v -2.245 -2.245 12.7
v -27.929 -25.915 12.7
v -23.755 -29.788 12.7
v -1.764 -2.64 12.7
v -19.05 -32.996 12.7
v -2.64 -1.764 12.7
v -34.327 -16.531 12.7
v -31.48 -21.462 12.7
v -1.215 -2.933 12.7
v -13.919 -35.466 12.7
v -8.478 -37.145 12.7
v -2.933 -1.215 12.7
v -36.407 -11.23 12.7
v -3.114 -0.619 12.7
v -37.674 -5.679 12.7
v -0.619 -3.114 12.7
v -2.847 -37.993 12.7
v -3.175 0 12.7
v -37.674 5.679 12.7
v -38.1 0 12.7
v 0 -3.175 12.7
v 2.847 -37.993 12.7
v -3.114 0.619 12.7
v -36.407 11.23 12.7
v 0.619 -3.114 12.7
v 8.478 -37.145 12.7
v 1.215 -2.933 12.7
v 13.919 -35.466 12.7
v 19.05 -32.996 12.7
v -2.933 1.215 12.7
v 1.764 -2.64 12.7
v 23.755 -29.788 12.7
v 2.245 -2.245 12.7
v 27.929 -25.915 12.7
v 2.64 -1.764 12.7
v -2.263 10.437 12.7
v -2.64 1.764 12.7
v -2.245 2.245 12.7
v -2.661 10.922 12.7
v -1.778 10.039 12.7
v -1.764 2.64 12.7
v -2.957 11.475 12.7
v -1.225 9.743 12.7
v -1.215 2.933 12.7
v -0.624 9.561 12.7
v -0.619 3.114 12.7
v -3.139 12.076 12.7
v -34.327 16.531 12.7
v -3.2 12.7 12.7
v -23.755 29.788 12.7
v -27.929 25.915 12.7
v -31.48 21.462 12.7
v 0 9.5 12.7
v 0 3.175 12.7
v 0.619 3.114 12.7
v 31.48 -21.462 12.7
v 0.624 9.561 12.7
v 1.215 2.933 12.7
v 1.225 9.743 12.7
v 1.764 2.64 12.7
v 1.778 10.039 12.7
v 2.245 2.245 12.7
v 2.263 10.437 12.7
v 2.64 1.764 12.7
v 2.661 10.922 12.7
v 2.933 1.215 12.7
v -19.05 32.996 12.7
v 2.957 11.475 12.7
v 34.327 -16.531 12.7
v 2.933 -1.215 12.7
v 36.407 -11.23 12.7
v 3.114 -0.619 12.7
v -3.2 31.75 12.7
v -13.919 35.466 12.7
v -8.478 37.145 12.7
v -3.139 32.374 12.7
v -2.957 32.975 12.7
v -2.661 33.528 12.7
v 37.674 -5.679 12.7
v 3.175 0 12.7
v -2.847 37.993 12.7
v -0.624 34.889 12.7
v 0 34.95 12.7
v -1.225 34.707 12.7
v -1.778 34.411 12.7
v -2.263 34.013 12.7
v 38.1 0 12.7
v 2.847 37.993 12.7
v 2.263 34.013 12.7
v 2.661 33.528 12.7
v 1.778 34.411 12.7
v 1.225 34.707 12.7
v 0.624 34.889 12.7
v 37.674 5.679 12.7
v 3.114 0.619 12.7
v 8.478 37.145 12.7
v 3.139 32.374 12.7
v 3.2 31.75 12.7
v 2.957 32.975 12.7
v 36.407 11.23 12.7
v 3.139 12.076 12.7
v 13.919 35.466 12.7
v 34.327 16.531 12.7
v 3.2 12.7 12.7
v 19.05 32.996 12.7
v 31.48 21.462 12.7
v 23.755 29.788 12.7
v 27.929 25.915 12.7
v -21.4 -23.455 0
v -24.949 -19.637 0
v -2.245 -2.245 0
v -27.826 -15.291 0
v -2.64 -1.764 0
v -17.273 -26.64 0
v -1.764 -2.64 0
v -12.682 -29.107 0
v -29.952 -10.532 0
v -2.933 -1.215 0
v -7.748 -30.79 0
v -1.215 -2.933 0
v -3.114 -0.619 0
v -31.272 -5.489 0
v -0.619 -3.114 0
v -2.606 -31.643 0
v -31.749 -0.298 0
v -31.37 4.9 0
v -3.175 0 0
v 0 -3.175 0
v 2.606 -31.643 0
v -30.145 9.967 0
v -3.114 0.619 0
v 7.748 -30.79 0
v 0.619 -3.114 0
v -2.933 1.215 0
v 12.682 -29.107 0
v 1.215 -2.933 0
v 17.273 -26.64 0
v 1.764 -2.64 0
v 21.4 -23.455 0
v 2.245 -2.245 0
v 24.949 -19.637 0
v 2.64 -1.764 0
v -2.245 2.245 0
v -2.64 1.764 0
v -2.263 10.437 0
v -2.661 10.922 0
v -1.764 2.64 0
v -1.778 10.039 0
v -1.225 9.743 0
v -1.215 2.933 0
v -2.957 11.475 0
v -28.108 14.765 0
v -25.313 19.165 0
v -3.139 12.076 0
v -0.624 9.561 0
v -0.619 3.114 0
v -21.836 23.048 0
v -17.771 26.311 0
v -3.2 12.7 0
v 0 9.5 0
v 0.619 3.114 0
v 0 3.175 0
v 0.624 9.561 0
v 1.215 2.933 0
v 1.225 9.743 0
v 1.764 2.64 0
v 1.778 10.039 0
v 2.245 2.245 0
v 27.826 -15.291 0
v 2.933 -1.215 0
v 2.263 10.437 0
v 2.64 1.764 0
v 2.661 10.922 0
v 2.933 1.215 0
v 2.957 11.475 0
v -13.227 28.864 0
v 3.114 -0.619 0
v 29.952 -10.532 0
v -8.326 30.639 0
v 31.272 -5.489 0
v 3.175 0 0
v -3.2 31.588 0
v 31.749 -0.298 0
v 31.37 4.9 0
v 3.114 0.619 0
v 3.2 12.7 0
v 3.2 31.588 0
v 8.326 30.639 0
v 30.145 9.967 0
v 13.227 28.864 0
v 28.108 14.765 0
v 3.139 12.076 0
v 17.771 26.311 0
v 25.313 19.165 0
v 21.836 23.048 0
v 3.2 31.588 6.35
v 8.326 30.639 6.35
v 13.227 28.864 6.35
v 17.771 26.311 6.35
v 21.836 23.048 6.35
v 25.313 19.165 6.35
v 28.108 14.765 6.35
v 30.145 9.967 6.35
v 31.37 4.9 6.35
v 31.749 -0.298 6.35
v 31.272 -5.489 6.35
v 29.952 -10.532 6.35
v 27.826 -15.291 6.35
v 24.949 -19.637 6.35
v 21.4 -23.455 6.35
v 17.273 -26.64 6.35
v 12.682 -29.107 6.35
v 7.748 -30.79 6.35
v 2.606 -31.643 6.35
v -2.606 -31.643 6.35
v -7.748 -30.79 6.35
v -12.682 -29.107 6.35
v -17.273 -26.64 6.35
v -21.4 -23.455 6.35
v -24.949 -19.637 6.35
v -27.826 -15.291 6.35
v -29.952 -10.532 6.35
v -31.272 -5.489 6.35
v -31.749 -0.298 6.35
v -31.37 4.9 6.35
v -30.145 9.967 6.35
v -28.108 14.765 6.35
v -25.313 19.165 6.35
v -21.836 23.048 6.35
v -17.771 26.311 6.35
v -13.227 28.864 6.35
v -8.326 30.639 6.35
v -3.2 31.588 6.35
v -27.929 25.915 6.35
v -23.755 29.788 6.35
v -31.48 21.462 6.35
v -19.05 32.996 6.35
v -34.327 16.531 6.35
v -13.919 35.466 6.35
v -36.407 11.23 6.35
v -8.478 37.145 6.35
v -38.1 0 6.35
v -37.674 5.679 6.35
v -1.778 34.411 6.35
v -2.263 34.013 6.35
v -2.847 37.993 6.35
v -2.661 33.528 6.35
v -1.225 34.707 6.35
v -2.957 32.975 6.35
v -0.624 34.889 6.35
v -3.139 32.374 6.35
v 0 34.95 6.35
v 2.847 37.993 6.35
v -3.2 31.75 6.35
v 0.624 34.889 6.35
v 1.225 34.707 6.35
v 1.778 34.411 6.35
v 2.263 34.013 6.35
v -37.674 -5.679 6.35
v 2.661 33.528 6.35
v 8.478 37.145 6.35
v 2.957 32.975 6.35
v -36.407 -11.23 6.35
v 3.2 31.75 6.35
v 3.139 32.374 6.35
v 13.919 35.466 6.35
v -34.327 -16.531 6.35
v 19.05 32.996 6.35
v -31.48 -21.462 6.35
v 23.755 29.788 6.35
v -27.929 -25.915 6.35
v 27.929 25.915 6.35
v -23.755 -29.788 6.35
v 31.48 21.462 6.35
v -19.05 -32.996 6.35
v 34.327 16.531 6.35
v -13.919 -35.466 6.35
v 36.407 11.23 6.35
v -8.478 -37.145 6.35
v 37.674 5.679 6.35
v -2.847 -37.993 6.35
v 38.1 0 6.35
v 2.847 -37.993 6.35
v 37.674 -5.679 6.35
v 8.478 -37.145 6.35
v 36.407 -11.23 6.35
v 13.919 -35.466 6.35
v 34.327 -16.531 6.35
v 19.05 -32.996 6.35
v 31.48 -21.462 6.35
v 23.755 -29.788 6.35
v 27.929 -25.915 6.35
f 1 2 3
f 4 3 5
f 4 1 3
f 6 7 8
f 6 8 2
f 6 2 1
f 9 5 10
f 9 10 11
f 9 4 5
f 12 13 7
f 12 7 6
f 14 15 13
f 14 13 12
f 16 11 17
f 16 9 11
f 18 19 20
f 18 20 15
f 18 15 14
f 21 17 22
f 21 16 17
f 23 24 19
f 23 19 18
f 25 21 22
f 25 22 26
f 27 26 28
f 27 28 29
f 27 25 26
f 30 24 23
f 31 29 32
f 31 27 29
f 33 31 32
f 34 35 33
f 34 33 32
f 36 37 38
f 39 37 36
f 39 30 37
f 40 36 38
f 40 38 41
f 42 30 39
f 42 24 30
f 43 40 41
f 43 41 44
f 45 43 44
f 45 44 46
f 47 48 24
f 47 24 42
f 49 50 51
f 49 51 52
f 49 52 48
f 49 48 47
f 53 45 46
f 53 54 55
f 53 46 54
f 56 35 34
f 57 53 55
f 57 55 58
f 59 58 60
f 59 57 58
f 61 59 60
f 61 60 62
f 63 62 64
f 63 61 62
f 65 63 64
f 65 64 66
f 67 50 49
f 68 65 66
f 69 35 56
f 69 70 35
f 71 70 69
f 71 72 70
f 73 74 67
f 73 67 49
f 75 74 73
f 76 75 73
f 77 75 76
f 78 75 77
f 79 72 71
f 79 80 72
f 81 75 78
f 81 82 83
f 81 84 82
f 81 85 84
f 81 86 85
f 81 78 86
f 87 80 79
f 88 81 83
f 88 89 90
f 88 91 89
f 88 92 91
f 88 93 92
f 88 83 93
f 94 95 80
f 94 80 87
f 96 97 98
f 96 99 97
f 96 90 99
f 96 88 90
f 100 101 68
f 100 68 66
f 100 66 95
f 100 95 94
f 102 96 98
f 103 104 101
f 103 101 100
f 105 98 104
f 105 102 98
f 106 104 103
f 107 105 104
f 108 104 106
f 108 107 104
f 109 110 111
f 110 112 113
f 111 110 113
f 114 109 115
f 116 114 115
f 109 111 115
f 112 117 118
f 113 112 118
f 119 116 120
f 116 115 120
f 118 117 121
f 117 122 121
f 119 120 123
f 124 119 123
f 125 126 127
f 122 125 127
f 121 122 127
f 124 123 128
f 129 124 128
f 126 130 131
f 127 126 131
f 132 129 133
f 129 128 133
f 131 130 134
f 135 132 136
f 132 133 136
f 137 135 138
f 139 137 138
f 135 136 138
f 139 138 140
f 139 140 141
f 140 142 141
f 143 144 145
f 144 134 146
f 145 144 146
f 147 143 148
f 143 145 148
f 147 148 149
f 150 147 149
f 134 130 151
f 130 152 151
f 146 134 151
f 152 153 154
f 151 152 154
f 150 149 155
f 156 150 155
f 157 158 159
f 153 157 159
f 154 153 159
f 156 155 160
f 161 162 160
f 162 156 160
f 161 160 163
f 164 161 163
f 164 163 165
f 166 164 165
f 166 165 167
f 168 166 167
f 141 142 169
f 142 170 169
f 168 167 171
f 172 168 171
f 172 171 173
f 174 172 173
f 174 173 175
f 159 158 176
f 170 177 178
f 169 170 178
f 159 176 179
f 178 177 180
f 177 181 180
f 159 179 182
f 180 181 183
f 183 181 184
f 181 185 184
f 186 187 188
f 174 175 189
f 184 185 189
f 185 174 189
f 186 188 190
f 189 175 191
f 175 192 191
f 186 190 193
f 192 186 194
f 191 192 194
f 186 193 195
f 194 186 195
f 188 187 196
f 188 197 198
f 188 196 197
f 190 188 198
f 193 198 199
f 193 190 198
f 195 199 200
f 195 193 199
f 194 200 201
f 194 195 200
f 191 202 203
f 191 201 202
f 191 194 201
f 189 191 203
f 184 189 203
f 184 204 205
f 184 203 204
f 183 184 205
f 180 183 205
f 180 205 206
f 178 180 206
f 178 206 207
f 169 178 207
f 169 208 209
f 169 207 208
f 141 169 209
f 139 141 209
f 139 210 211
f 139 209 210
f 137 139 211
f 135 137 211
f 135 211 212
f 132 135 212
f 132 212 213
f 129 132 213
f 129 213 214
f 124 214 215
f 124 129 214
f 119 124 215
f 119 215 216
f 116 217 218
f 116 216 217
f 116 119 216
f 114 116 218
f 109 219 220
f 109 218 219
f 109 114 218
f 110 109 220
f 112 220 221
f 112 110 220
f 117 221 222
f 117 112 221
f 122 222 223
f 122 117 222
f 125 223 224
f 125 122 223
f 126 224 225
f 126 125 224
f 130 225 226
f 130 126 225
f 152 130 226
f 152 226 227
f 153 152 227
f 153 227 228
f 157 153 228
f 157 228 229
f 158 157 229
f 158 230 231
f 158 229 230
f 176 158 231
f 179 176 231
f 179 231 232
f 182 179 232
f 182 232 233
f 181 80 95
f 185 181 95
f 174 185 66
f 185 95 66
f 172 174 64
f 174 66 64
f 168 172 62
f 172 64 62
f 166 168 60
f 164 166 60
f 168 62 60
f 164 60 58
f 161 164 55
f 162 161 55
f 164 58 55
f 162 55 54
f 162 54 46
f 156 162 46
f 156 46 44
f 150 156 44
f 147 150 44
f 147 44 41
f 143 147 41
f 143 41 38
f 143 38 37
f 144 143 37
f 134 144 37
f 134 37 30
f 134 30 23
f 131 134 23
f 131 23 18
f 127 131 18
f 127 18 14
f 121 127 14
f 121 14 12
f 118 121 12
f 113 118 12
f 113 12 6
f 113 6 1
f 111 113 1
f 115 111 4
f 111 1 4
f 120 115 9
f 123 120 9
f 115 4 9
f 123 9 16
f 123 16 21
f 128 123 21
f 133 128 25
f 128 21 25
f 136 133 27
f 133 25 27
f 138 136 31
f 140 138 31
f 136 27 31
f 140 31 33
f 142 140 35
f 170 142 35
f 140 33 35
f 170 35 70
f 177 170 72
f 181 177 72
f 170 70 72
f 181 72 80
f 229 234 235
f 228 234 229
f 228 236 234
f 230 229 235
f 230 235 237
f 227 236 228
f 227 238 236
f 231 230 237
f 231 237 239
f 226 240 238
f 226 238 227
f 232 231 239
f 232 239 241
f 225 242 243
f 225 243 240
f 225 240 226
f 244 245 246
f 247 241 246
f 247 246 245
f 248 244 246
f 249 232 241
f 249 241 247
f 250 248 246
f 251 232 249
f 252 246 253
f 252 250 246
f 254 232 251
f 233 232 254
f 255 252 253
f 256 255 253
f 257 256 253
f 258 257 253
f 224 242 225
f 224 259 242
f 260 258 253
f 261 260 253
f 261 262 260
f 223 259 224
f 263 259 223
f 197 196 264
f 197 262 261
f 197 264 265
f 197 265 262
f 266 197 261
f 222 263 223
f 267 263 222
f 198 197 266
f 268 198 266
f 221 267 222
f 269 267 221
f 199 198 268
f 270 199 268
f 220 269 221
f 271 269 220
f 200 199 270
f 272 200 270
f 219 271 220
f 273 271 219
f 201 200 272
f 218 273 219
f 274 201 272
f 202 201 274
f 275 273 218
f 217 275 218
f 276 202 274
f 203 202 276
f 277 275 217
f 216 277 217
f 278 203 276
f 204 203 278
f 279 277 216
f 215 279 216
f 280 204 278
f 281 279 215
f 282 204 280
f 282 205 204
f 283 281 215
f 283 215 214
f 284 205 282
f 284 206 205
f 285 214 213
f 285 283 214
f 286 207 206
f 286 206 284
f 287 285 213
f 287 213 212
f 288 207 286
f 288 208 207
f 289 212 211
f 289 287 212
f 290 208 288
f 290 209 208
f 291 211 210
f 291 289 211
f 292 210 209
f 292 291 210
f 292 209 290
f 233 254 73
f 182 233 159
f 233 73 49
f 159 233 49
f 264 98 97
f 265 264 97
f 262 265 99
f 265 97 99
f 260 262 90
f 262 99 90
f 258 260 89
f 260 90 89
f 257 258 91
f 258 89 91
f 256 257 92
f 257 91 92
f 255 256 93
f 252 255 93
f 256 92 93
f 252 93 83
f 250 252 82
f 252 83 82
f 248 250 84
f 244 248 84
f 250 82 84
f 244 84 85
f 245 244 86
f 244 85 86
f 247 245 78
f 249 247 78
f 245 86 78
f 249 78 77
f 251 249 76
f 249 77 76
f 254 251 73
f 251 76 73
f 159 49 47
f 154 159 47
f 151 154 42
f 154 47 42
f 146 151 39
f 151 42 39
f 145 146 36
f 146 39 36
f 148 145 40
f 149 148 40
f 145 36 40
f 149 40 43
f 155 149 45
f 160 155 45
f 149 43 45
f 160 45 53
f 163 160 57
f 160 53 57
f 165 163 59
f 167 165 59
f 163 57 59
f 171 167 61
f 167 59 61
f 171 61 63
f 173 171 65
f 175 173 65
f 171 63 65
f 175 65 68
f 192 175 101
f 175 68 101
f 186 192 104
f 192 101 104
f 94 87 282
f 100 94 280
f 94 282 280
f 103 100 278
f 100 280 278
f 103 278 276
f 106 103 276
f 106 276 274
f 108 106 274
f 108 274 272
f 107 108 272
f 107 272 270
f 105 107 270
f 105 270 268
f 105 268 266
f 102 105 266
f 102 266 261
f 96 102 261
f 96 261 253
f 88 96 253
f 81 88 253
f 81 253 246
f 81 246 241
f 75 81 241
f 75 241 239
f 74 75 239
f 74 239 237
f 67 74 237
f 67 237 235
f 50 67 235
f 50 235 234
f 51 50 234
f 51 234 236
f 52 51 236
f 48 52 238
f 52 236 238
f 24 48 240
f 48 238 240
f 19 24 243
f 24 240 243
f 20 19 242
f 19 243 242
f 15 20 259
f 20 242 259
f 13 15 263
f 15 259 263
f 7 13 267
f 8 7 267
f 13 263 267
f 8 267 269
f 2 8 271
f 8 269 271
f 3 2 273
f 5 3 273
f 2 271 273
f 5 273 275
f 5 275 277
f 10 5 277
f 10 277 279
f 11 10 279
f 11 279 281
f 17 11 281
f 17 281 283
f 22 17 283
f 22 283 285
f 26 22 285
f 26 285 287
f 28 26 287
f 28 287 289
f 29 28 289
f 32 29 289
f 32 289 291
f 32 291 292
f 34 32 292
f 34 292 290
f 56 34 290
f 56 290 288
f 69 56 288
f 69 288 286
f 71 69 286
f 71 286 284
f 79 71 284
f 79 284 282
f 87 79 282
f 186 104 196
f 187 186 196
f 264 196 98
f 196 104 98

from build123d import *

# Parameters (mm, degrees)
F0_R     = 38.1
F1_DEPTH = 12.7
F2_R     = 38.1
F2_R_2   = 31.75
F3_DEPTH = 6.35
F4_R     = 3.175
F5_DEPTH = 12.701
F7_DEPTH = 12.701


with BuildPart() as f1:
    # F0 (on Top) → F1 (new body)
    with BuildSketch(Plane.XY):
        Circle(F0_R)
    extrude(amount=F1_DEPTH)

    # F2 (on face) → F3 (cut)
    with BuildSketch(Plane(origin=(0, 0, 0), x_dir=(1, 0, 0), z_dir=(0, 0, -1))):
        Circle(F2_R)
        Circle(F2_R_2, mode=Mode.SUBTRACT)
    extrude(amount=-F3_DEPTH, mode=Mode.SUBTRACT)

    # F4 (on face) → F5 (cut, through all)
    with BuildSketch(Plane.XY.offset(12.7)):
        Circle(F4_R)
    extrude(amount=-F5_DEPTH, mode=Mode.SUBTRACT)

    # F6 (on face) → F7 (cut, through all)
    with BuildSketch(Plane.XY.offset(12.7)):
        with BuildLine():
            Line((-3.2004, 31.75), (-3.2004, 12.7))
            ThreePointArc((-3.2004, 12.7), (0, 9.4996), (3.2004, 12.7))
            Line((3.2004, 12.7), (3.2004, 31.75))
            ThreePointArc((3.2004, 31.75), (0, 34.9504), (-3.2004, 31.75))
        make_face()
    extrude(amount=-F7_DEPTH, mode=Mode.SUBTRACT)


solid = f1.part
